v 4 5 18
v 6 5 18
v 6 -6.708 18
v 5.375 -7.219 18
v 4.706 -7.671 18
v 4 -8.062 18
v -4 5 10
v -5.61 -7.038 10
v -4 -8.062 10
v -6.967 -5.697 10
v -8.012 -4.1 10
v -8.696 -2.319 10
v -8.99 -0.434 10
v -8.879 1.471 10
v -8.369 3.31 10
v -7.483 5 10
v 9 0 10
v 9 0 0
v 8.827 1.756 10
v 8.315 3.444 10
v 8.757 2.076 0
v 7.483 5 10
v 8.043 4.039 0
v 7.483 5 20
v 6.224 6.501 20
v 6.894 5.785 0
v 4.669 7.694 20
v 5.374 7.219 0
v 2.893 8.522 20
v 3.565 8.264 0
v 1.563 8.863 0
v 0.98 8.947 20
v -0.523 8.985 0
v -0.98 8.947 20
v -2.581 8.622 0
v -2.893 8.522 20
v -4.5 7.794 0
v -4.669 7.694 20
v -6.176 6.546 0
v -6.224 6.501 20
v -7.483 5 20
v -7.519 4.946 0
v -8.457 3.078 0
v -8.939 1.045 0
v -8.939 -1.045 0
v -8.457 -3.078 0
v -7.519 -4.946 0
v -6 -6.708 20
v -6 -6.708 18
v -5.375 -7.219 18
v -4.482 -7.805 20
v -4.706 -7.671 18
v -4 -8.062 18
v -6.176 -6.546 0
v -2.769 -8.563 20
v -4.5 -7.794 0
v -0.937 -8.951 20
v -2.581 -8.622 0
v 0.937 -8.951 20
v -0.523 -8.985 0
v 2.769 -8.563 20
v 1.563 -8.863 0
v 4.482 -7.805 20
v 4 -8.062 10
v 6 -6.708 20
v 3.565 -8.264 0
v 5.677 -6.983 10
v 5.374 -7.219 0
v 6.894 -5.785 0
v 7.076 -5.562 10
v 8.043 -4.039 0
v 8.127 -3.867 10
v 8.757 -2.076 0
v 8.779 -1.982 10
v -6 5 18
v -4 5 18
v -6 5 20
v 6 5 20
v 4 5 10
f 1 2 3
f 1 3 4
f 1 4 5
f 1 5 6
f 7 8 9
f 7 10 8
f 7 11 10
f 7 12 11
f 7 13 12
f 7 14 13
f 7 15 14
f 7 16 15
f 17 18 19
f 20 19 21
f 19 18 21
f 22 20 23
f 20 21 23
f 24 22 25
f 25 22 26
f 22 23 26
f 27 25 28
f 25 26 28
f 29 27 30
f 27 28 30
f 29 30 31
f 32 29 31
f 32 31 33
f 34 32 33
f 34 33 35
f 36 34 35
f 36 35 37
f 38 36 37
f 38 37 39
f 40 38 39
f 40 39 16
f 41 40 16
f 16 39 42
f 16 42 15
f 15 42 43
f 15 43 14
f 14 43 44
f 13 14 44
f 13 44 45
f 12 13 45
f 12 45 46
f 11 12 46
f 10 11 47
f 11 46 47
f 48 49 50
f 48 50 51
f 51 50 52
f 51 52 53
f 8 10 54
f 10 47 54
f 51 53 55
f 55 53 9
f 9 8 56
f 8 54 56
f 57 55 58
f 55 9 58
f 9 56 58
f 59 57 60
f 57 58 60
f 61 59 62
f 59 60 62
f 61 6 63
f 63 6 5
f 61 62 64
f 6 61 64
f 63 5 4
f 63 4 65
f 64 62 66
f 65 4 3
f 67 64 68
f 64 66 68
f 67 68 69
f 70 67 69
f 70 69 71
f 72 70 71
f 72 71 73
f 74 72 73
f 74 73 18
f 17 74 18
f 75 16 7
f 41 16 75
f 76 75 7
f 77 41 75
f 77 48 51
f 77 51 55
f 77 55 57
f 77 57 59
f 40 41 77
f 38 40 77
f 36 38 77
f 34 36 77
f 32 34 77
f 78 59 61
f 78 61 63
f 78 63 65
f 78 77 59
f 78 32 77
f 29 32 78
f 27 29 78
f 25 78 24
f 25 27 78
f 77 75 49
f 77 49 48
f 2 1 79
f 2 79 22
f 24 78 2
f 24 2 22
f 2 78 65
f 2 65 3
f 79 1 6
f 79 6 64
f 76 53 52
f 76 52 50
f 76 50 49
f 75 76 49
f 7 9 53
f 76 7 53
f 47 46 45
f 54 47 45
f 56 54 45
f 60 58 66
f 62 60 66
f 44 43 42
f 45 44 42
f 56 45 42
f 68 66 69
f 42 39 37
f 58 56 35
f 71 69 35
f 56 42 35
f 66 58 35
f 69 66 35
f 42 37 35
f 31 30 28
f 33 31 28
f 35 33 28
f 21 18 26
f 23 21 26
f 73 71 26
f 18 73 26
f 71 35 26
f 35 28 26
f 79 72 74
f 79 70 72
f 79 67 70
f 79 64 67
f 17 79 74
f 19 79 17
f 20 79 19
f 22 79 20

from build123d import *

# Parameters (mm, degrees)
F0_R          = 9
F1_DEPTH      = 20
F3_DEPTH      = 5
F3_DEPTH_BACK = 25


with BuildPart() as f1:
    # F0 (on Top) → F1 (new body)
    with BuildSketch(Plane.XY):
        Circle(F0_R)
    extrude(amount=F1_DEPTH)

    # F2 (on Front) → F3 (cut, two sides)
    with BuildSketch(Plane.XZ) as f3_sk:
        Polygon((6, 18), (4, 18), (4, 10), (9, 10), (9, 20), (6, 20), align=None)
        Polygon((-6, 18), (-6, 20), (-9, 20), (-9, 10), (-4, 10), (-4, 18), align=None)
    extrude(amount=-F3_DEPTH, mode=Mode.SUBTRACT)
    extrude(f3_sk.sketch, amount=F3_DEPTH_BACK, mode=Mode.SUBTRACT)


solid = f1.part
